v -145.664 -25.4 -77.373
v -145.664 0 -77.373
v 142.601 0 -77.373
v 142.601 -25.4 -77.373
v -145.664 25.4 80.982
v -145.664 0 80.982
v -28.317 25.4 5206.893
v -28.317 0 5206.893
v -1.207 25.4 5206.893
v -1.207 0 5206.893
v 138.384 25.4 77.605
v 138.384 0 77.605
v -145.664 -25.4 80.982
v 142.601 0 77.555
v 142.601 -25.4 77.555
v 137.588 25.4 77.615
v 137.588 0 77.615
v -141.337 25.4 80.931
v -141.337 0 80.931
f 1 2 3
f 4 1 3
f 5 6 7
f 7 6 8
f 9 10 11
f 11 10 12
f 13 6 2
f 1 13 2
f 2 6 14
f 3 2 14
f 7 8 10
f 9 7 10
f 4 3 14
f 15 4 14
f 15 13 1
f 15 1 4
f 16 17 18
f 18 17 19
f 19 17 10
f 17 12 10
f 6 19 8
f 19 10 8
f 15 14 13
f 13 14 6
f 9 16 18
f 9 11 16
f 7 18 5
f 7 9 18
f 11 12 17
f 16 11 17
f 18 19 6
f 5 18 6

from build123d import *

# Parameters (mm, degrees)
F1_DEPTH = 25.4
F3_DEPTH = 25.4


with BuildPart() as f1:
    # F0 (on Front) → F1 (new body)
    with BuildSketch(Plane.XZ):
        Polygon((142.6013857126, 77.5552615523), (-145.6644237041, 80.9822902083), (-145.6644237041, -77.3728713393), (142.6013857126, -77.3728713393), align=None)
    extrude(amount=F1_DEPTH)


with BuildPart() as f3:
    # F2 (on face) → F3 (new body)
    with BuildSketch(Plane(origin=(0, 0, 0), x_dir=(-1, 0, 0), z_dir=(0, 1, 0))):
        Polygon((-137.5883387488, 77.6148588235), (141.3368386675, 80.9308420052), (13.6248651723, 4752.6540945443), align=None)
        Polygon((-137.5883387488, 77.6148588235), (13.6248651723, 4752.6540945443), (1.2072325917, 5206.8929672241), (-138.3837304771, 77.6054028625), align=None)
        Polygon((13.6248651723, 4752.6540945443), (28.3171301609, 5206.8929672241), (1.2072325917, 5206.8929672241), align=None)
        Polygon((141.3368386675, 80.9308420052), (145.6644237041, 80.9822902083), (28.3171301609, 5206.8929672241), (13.6248651723, 4752.6540945443), align=None)
    extrude(amount=F3_DEPTH)


solid = Compound([f1.part, f3.part])
